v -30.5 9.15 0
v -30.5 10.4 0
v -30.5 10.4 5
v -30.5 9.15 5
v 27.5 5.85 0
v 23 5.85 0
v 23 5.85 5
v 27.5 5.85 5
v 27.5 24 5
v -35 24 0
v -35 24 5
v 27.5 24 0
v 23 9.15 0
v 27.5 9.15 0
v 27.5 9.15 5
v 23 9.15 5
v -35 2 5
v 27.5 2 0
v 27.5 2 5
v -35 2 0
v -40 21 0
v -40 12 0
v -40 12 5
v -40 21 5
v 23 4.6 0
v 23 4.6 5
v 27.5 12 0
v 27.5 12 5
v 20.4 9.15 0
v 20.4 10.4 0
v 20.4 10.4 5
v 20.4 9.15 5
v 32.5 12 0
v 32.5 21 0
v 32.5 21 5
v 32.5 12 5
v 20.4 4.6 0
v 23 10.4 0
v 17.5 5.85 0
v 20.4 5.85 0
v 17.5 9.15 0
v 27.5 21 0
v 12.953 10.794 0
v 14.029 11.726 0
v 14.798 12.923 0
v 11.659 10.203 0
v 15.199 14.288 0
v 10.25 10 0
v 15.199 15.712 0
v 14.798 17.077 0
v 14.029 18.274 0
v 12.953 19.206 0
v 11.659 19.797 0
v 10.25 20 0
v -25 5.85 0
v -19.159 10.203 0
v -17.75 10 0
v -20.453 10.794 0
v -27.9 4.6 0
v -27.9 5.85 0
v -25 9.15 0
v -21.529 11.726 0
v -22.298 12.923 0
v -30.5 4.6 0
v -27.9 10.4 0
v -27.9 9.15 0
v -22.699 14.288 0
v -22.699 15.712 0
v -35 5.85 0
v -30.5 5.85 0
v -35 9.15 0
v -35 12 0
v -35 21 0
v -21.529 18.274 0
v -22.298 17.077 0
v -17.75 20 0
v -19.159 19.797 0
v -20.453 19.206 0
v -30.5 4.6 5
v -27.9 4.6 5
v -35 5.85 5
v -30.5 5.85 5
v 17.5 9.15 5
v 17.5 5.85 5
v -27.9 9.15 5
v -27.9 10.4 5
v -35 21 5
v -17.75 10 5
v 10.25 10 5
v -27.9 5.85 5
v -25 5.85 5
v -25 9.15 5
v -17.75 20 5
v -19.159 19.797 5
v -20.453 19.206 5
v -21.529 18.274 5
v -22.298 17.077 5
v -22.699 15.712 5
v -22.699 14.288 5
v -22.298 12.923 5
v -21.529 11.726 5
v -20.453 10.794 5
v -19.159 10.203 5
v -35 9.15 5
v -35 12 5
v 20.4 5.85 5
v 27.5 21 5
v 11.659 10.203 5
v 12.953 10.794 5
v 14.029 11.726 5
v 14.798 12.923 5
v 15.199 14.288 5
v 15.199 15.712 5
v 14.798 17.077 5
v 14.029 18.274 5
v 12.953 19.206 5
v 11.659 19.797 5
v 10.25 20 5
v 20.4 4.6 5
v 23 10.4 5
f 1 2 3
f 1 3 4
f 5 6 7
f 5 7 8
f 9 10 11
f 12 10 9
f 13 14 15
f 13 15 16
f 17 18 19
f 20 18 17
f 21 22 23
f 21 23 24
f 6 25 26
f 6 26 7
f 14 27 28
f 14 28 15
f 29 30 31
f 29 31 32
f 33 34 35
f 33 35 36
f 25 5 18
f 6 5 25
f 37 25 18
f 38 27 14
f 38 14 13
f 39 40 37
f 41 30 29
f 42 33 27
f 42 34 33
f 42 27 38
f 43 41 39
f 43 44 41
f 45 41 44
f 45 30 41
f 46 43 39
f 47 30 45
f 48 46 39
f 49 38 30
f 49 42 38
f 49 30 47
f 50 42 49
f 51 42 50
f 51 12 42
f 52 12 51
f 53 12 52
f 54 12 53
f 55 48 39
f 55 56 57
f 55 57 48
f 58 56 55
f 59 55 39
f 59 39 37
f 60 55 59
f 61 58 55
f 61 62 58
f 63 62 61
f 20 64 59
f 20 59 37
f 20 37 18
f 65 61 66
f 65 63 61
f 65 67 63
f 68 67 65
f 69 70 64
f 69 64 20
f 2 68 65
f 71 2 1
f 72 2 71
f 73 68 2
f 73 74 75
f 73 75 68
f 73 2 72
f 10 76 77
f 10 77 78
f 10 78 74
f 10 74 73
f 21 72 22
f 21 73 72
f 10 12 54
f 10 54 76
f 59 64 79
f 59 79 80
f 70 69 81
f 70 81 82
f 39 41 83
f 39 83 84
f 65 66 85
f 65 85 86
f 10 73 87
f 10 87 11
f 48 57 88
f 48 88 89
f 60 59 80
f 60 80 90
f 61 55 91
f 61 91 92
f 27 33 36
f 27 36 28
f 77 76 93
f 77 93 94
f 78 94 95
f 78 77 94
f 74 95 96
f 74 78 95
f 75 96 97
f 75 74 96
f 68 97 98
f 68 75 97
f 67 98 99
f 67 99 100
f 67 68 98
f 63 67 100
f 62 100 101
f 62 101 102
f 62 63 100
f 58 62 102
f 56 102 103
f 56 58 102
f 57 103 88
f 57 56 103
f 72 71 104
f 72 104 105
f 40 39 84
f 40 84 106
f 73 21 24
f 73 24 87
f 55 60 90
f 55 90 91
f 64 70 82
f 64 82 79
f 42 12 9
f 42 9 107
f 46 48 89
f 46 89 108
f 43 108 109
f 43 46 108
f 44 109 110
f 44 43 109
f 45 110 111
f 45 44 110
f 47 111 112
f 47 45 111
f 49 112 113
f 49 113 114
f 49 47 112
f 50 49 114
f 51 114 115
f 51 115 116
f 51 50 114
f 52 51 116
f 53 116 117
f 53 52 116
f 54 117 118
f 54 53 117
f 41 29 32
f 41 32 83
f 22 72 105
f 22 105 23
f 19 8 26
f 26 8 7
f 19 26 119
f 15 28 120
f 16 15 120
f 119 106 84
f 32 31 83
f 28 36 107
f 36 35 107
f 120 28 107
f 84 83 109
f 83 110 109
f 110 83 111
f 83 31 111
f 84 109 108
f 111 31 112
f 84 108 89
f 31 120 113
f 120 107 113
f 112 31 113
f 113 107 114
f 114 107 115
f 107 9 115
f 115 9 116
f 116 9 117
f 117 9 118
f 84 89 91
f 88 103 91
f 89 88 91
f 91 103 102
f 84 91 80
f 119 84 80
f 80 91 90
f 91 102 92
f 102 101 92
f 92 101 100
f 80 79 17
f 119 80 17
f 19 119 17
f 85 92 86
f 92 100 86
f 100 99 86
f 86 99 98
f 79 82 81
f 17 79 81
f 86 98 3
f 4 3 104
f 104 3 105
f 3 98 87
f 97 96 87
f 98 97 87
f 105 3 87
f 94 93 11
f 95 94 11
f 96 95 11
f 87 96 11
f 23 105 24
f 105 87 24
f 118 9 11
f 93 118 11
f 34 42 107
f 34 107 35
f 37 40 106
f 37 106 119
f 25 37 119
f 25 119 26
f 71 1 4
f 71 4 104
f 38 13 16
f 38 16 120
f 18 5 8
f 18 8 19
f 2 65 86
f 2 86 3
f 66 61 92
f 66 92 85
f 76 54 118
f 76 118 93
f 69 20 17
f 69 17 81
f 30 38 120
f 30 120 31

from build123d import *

# Parameters (mm, degrees)
PLASTINA_DEPTH = 5


with BuildPart() as part:
    # Eskiz_kontur → Plastina (new body)
    with BuildSketch(Plane.XY):
        Polygon((32.5, 12), (27.5, 12), (27.5, 9.15), (23, 9.15), (23, 10.4), (20.4, 10.4), (20.4, 9.15), (17.5, 9.15), (17.5, 5.85), (20.4, 5.85), (20.4, 4.6), (23, 4.6), (23, 5.85), (27.5, 5.85), (27.5, 2), (-35, 2), (-35, 5.85), (-30.5, 5.85), (-30.5, 4.6), (-27.9, 4.6), (-27.9, 5.85), (-25, 5.85), (-25, 9.15), (-27.9, 9.15), (-27.9, 10.4), (-30.5, 10.4), (-30.5, 9.15), (-35, 9.15), (-35, 12), (-40, 12), (-40, 21), (-35, 21), (-35, 24), (27.5, 24), (27.5, 21), (32.5, 21), align=None)
        with BuildLine():
            Line((10.25, 20), (-17.75, 20))
            ThreePointArc((-17.75, 20), (-22.75, 15), (-17.75, 10))
            Line((-17.75, 10), (10.25, 10))
            ThreePointArc((10.25, 10), (15.25, 15), (10.25, 20))
        make_face(mode=Mode.SUBTRACT)
    extrude(amount=PLASTINA_DEPTH)


solid = part.part
